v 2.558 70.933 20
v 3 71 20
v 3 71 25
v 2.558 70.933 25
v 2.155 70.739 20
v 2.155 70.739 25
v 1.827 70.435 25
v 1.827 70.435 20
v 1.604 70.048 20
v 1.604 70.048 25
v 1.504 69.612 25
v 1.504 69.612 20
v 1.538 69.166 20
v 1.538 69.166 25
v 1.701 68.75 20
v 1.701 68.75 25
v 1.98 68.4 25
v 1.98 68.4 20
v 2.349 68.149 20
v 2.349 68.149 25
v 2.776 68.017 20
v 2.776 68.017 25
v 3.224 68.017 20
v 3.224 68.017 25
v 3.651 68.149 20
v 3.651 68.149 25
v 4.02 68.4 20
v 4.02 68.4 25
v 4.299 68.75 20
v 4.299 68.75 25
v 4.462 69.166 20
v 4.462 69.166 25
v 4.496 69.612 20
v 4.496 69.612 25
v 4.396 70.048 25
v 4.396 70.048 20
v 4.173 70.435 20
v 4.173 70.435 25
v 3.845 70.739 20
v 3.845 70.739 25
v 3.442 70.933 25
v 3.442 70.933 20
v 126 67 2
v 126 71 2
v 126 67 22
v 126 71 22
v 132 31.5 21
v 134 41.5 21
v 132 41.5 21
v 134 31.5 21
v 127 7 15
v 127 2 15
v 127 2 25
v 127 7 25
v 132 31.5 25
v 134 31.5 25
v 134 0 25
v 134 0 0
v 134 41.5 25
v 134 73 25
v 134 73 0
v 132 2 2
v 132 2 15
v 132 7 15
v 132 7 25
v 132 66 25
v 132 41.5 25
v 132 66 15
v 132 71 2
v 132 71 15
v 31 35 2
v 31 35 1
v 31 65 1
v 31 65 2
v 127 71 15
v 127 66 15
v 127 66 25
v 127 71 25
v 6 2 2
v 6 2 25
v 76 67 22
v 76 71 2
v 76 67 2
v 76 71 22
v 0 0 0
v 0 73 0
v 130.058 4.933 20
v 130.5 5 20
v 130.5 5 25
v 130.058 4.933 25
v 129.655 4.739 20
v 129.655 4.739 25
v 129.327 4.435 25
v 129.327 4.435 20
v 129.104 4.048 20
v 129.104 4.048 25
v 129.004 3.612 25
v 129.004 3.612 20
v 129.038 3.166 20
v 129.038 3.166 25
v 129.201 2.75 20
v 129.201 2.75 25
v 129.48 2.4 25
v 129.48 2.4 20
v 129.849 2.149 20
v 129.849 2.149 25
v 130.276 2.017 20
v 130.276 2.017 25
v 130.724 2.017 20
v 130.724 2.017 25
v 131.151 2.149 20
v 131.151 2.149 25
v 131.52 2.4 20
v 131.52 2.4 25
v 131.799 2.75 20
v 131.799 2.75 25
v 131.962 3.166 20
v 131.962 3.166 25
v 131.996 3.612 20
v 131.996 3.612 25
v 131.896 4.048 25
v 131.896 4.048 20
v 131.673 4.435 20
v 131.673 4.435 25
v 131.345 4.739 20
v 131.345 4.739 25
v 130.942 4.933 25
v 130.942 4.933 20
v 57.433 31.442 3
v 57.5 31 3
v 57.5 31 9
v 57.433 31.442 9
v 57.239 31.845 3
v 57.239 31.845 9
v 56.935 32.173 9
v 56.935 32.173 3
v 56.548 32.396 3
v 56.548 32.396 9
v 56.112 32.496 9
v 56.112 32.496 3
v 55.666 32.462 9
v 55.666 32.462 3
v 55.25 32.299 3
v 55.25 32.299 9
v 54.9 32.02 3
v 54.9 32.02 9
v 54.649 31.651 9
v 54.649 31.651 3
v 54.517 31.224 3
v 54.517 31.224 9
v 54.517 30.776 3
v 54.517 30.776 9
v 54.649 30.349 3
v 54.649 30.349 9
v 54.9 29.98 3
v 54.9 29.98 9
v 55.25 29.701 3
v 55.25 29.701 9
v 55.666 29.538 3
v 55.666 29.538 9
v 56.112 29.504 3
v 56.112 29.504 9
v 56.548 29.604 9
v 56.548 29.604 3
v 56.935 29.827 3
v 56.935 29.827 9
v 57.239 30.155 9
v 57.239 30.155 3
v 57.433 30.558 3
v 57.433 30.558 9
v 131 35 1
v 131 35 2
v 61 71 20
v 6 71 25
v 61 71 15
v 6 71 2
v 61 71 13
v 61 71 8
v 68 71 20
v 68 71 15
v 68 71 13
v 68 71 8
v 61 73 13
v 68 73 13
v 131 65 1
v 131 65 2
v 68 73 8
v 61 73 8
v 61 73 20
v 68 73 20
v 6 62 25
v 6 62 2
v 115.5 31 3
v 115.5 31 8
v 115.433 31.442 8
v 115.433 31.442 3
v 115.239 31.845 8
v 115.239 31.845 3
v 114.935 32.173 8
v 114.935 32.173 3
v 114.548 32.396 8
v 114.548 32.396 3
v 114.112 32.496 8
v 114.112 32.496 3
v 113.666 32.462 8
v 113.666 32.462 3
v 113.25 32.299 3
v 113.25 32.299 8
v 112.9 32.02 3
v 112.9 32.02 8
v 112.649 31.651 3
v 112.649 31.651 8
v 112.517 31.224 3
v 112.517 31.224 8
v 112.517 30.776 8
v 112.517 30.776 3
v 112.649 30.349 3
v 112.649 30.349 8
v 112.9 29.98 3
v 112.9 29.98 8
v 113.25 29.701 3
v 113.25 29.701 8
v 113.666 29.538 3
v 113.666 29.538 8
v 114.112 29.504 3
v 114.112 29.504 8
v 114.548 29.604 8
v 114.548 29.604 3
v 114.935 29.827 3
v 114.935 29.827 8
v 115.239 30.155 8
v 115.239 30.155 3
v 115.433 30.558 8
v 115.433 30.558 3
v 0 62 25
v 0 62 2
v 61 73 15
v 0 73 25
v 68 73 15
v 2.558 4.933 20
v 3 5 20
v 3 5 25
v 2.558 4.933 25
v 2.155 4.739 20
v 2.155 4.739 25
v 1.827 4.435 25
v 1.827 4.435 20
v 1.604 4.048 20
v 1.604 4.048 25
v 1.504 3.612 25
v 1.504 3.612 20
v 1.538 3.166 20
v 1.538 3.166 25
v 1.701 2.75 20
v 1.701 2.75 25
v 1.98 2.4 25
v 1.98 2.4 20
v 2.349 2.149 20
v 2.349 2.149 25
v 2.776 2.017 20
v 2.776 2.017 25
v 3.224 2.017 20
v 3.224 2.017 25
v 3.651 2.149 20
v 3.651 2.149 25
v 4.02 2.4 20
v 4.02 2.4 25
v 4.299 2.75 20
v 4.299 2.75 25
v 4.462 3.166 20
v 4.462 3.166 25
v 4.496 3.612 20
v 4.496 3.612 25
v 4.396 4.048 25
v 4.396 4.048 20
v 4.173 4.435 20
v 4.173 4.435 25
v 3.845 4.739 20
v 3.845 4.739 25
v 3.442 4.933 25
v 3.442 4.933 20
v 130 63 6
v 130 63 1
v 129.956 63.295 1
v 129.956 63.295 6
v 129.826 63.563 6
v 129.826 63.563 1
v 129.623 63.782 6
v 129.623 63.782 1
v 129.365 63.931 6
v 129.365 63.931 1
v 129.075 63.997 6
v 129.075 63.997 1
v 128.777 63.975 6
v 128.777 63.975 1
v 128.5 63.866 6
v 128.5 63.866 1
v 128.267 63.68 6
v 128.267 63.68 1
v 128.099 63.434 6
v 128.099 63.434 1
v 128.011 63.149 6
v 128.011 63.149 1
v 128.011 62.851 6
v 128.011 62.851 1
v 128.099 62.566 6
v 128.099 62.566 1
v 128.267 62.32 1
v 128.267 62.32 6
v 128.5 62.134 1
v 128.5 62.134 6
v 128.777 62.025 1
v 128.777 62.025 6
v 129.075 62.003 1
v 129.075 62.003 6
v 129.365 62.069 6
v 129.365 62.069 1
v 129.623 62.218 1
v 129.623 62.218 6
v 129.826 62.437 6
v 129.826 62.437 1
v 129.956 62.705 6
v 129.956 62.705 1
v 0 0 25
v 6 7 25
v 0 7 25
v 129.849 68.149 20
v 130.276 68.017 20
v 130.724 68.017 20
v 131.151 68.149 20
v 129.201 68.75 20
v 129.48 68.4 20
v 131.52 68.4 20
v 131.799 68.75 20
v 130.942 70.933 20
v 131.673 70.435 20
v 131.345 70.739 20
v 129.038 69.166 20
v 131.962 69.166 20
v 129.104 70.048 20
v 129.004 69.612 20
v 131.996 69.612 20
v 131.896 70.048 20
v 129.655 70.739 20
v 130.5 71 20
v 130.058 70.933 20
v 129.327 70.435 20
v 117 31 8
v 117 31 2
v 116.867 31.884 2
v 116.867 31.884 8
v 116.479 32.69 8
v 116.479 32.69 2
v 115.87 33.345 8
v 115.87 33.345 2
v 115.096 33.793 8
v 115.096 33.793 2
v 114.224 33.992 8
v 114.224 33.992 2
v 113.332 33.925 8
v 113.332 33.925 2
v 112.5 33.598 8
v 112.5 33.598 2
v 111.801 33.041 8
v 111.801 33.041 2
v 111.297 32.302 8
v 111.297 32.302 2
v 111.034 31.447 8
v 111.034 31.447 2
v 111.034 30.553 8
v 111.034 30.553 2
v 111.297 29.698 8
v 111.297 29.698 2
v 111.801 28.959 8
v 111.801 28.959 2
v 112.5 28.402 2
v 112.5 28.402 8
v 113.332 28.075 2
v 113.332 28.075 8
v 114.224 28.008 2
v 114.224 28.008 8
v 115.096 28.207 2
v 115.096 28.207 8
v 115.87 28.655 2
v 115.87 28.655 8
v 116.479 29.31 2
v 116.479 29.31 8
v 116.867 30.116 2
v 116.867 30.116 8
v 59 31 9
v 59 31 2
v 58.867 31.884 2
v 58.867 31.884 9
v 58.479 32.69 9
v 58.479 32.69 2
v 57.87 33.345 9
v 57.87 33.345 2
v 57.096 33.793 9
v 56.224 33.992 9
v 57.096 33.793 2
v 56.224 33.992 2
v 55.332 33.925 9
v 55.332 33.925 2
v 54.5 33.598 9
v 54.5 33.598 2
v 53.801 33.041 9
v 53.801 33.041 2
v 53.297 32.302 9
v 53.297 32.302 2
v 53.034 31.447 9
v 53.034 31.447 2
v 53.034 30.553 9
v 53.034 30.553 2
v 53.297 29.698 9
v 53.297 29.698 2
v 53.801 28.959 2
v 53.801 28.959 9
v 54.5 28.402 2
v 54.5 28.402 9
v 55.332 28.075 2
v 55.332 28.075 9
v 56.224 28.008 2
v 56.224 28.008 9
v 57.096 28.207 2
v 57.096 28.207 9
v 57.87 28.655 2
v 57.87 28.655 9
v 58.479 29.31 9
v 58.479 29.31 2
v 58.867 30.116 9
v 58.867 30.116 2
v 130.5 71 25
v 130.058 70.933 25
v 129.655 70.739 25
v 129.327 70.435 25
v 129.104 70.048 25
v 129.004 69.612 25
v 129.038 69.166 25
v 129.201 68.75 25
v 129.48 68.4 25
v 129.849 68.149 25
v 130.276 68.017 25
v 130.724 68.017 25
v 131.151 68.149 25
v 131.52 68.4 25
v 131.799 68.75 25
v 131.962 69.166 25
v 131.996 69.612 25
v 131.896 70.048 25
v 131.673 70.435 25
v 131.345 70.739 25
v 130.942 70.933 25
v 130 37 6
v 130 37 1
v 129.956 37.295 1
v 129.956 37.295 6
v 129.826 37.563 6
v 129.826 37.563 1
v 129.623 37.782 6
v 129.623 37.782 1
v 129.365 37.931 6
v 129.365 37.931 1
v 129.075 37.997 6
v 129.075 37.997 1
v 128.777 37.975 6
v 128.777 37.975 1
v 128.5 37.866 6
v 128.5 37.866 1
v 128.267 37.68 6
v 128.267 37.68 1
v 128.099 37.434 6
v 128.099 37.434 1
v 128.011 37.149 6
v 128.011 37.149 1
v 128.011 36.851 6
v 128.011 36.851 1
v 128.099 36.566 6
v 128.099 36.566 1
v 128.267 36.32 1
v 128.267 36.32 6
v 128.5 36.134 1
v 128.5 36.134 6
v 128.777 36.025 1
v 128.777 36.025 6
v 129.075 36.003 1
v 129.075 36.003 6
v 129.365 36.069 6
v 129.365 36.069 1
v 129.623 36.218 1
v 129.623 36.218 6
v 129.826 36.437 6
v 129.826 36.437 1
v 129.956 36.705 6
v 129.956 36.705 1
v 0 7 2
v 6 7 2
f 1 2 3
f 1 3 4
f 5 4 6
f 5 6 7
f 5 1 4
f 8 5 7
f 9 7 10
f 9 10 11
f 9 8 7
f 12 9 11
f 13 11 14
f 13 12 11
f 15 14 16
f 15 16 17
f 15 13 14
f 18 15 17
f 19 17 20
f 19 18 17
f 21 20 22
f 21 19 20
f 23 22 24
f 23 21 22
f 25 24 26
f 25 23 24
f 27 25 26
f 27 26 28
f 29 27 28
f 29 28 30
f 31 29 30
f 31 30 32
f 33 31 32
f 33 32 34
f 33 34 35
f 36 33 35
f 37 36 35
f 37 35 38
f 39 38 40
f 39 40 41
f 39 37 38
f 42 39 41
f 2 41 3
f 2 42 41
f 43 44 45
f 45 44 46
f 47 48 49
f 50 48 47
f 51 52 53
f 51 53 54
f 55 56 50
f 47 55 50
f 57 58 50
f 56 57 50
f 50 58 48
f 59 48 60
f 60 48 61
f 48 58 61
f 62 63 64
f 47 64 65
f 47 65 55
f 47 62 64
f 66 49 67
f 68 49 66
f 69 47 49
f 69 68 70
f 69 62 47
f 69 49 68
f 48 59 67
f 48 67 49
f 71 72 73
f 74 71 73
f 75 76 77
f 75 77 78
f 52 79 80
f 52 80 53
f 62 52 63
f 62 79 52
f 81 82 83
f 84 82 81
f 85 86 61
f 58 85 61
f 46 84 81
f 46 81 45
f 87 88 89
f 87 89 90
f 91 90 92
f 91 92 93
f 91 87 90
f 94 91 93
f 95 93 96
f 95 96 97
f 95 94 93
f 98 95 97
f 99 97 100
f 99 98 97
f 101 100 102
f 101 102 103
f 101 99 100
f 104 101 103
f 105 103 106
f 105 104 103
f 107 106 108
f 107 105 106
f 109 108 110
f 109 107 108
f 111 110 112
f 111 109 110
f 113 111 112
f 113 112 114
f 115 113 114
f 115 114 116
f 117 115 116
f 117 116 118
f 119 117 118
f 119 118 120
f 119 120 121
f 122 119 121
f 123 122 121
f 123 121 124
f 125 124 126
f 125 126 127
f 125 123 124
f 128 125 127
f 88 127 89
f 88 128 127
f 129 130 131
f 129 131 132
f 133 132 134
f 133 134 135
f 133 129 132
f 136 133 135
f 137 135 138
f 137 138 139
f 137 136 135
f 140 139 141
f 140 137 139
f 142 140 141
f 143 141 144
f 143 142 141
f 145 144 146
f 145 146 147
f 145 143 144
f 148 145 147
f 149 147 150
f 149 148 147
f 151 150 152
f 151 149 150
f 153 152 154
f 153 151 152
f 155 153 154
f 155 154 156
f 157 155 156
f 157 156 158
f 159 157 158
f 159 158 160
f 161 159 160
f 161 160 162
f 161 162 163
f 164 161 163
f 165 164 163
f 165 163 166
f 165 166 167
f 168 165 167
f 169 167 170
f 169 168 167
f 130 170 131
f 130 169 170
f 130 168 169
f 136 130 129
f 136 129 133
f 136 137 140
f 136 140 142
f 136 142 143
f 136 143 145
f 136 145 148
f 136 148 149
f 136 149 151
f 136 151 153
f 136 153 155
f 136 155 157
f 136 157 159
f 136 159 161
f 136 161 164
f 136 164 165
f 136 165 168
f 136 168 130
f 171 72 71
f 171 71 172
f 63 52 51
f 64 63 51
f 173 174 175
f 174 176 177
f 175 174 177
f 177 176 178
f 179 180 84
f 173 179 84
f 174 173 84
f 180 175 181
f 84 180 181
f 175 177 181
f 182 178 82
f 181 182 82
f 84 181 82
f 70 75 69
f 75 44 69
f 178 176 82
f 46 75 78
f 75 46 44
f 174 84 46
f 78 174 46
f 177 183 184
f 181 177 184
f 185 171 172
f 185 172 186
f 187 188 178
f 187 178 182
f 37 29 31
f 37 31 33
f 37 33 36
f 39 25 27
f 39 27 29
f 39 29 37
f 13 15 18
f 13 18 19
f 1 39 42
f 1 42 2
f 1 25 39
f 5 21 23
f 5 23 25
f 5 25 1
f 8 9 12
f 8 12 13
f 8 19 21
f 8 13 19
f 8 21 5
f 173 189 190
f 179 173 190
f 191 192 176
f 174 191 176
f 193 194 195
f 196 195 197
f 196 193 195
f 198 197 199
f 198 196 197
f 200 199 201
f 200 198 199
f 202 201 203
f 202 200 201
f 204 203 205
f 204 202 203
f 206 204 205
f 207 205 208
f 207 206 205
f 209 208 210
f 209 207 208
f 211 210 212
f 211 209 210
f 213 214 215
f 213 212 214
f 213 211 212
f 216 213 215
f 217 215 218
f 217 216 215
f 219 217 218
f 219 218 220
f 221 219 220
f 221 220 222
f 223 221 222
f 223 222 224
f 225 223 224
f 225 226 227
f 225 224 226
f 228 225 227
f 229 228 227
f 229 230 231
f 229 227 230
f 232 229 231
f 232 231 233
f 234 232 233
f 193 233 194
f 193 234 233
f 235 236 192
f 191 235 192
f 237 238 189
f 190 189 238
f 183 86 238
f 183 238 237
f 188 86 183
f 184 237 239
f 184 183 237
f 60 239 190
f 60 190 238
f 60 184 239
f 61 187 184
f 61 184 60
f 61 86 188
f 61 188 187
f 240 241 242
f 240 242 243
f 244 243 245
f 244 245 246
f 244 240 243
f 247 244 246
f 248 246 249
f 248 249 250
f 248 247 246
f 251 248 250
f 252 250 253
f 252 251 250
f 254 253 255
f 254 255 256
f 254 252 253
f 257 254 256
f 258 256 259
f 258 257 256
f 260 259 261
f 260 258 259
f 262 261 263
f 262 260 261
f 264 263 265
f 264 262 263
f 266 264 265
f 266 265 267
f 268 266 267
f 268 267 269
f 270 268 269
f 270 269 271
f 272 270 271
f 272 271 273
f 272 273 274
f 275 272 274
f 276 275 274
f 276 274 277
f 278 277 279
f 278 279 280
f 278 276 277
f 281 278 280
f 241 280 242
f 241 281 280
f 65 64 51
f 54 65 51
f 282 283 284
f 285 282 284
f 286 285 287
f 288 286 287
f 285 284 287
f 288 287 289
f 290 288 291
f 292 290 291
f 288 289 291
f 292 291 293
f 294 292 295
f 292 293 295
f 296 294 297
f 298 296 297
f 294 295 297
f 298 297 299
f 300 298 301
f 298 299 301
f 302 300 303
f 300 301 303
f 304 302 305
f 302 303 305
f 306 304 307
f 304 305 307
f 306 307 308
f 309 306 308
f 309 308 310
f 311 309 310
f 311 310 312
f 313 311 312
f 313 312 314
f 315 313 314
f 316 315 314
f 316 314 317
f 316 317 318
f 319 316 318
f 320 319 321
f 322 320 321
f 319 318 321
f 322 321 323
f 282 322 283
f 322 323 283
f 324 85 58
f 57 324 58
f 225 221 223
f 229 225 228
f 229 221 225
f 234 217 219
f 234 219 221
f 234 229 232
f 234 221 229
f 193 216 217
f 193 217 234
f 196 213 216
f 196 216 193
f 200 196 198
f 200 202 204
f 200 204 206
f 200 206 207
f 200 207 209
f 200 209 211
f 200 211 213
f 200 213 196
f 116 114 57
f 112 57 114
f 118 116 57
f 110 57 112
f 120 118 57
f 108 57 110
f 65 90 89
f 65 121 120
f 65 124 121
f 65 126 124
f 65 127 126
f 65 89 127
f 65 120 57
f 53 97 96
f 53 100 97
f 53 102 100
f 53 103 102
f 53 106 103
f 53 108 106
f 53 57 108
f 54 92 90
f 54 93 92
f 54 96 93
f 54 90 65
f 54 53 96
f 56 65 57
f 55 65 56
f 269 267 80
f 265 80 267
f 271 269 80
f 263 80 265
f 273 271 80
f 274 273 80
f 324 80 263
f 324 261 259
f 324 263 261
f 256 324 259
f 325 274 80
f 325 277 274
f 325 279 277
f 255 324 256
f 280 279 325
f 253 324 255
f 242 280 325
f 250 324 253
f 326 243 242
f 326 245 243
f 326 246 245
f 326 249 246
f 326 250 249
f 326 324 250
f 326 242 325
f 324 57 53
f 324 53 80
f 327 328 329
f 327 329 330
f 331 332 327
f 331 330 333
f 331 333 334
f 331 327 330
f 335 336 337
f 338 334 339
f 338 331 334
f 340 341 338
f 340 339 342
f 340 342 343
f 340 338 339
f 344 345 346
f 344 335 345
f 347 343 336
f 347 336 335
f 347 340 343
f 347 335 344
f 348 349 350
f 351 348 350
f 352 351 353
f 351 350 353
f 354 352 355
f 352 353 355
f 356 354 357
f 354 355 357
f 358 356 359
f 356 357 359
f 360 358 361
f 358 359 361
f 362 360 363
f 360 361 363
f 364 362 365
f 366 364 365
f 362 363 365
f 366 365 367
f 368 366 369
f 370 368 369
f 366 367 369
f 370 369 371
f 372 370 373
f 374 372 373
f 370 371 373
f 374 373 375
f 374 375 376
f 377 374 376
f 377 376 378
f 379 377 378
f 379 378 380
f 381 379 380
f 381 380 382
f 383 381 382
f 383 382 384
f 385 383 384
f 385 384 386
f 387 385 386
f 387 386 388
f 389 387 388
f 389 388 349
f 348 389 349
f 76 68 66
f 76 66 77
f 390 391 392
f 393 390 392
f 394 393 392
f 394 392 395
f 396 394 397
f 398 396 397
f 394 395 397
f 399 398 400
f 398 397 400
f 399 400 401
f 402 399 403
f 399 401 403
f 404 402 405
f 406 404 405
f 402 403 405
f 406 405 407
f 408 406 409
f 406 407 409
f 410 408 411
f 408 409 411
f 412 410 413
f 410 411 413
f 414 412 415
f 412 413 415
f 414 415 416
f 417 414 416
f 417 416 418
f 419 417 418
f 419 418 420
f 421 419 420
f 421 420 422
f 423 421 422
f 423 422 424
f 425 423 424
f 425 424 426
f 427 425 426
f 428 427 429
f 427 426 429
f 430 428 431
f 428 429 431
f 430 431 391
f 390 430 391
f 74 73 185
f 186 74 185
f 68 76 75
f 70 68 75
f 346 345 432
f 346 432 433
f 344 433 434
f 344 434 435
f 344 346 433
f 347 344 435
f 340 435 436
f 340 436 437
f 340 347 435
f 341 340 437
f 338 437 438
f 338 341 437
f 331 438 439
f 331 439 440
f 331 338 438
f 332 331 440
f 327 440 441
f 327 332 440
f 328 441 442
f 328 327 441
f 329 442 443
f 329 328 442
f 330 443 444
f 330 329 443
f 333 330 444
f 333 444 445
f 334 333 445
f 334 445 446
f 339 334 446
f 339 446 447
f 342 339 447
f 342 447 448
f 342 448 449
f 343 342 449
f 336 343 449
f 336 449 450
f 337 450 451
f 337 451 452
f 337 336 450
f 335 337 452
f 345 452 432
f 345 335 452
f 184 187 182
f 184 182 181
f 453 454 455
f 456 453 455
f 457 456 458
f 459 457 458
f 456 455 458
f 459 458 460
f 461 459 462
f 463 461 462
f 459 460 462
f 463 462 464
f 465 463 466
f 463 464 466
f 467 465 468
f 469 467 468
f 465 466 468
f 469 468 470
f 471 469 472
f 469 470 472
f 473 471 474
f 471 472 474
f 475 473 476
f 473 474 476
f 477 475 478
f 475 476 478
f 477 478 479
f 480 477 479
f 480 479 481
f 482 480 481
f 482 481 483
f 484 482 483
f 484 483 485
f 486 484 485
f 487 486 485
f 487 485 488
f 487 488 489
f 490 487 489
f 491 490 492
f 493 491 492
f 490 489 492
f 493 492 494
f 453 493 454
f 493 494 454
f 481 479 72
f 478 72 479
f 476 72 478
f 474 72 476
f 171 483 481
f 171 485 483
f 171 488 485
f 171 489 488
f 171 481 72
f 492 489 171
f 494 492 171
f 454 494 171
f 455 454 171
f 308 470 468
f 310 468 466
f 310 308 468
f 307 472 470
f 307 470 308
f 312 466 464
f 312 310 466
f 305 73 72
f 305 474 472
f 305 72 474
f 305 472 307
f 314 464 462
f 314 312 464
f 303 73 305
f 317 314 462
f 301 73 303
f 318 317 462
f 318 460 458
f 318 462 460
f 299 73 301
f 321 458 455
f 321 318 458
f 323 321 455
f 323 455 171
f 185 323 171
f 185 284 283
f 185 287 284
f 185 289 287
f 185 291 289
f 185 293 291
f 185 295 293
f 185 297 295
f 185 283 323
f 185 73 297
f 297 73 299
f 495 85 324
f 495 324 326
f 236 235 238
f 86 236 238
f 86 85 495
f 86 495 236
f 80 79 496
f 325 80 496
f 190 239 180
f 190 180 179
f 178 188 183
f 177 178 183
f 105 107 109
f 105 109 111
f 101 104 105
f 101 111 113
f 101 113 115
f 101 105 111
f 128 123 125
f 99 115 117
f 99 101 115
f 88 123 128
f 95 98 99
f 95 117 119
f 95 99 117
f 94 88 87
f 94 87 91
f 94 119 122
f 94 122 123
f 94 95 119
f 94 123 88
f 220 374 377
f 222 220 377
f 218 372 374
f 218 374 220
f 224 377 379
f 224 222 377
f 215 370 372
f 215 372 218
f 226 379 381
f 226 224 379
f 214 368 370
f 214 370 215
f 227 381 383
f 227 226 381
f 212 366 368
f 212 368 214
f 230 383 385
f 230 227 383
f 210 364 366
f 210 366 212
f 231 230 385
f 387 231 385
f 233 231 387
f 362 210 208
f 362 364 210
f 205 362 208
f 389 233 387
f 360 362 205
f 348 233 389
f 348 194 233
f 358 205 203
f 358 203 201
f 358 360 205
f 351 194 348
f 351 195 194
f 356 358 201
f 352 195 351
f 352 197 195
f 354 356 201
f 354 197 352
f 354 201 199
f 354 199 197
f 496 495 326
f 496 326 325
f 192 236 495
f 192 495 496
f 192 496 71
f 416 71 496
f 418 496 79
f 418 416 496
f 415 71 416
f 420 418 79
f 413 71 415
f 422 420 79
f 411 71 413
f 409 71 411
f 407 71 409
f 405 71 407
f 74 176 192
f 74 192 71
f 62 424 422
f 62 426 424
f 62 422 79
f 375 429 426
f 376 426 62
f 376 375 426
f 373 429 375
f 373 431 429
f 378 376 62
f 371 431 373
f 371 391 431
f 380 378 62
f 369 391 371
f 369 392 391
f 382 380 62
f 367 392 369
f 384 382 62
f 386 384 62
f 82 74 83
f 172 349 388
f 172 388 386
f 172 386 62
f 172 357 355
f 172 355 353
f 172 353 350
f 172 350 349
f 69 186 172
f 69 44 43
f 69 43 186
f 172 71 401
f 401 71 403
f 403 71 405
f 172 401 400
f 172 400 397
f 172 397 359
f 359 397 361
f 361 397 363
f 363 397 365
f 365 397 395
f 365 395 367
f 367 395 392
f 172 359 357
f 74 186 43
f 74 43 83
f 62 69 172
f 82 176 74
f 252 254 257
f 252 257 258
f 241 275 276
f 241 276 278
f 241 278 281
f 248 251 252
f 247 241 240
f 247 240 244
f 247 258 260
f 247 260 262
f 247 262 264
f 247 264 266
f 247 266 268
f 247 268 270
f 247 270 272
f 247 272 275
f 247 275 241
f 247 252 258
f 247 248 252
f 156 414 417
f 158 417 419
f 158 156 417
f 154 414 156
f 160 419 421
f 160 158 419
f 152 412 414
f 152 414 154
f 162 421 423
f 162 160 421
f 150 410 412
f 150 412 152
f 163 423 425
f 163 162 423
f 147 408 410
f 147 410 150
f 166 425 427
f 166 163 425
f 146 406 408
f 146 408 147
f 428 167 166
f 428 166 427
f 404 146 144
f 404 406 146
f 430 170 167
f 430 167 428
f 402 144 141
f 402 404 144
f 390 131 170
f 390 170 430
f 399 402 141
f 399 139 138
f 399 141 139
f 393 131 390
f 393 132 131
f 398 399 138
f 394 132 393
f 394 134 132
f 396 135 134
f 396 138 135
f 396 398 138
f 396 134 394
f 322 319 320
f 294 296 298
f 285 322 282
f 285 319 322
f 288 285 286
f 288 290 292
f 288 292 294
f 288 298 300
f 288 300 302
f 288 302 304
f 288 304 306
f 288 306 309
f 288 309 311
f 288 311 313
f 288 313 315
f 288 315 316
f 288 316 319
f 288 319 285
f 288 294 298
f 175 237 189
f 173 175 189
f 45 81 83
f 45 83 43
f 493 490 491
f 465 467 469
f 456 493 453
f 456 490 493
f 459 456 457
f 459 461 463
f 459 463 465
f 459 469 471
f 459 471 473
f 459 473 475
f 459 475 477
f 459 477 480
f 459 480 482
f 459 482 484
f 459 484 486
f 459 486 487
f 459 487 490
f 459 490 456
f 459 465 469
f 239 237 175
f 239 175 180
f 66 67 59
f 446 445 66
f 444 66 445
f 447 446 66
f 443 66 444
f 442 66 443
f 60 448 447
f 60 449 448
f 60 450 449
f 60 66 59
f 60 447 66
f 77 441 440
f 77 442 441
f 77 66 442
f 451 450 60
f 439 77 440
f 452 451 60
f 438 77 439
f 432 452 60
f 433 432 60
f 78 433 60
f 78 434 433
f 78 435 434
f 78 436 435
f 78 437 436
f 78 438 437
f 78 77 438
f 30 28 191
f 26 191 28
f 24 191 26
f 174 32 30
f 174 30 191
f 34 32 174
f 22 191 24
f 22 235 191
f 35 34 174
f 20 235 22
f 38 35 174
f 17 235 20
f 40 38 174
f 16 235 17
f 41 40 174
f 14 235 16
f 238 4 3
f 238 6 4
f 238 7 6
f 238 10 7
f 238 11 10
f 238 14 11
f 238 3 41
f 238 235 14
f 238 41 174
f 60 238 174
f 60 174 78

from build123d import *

# Parameters (mm, degrees)
BOX_W             = 134
BOX_H             = 73
BOX_DEPTH         = 25
BOX001_W          = 126
BOX001_H          = 69
BOX001_DEPTH      = 23
BOX002_W          = 10
BOX002_H          = 55
BOX002_DEPTH      = 23
BOX003_W          = 100
BOX003_H          = 30
BOX003_DEPTH      = 1
CYLINDER_R        = 1
CYLINDER_DEPTH    = 5
CYLINDER001_R     = 1
CYLINDER001_DEPTH = 5
CYLINDER002_R     = 3
CYLINDER002_DEPTH = 7
CYLINDER003_R     = 1.5
CYLINDER003_DEPTH = 6
CYLINDER004_R     = 3
CYLINDER004_DEPTH = 7
CYLINDER005_R     = 1.5
CYLINDER005_DEPTH = 6
BOX004_W          = 7
BOX004_H          = 5
BOX004_DEPTH      = 7
BOX005_W          = 7
BOX005_H          = 5
BOX005_DEPTH      = 5
BOX006_W          = 50
BOX006_H          = 20
BOX006_DEPTH      = 4
BOX007_W          = 4
BOX007_H          = 10
BOX007_DEPTH      = 2
CYLINDER006_R     = 1.5
CYLINDER006_DEPTH = 5
CYLINDER007_R     = 1.5
CYLINDER007_DEPTH = 5
BOX008_W          = 5
BOX008_H          = 5
BOX008_DEPTH      = 10
BOX009_W          = 5
BOX009_H          = 5
BOX009_DEPTH      = 10
CYLINDER008_R     = 1.5
CYLINDER008_DEPTH = 5
CYLINDER009_R     = 1.5
CYLINDER009_DEPTH = 5


with BuildPart() as part:
    # Box → Box (join)
    with BuildSketch(Plane.XY):
        with Locations((67, 36.5)):
            Rectangle(BOX_W, BOX_H)
    extrude(amount=BOX_DEPTH)

    # Box001 → Box001 (cut)
    with BuildSketch(Plane(origin=(6, 2, 2), x_dir=(1, 0, 0), z_dir=(0, 0, 1))):
        with Locations((63, 34.5)):
            Rectangle(BOX001_W, BOX001_H)
    extrude(amount=BOX001_DEPTH, mode=Mode.SUBTRACT)

    # Box002 → Box002 (cut)
    with BuildSketch(Plane(origin=(-2, 7, 2), x_dir=(1, 0, 0), z_dir=(0, 0, 1))):
        with Locations((5, 27.5)):
            Rectangle(BOX002_W, BOX002_H)
    extrude(amount=BOX002_DEPTH, mode=Mode.SUBTRACT)

    # Box003 → Box003 (cut)
    with BuildSketch(Plane(origin=(31, 35, 1), x_dir=(1, 0, 0), z_dir=(0, 0, 1))):
        with Locations((50, 15)):
            Rectangle(BOX003_W, BOX003_H)
    extrude(amount=BOX003_DEPTH, mode=Mode.SUBTRACT)

    # Cylinder → Cylinder (join)
    with BuildSketch(Plane(origin=(129, 37, 1), x_dir=(1, 0, 0), z_dir=(0, 0, 1))):
        Circle(CYLINDER_R)
    extrude(amount=CYLINDER_DEPTH)

    # Cylinder001 → Cylinder001 (join)
    with BuildSketch(Plane(origin=(129, 63, 1), x_dir=(1, 0, 0), z_dir=(0, 0, 1))):
        Circle(CYLINDER001_R)
    extrude(amount=CYLINDER001_DEPTH)

    # Cylinder002 → Cylinder002 (join)
    with BuildSketch(Plane(origin=(114, 31, 1), x_dir=(1, 0, 0), z_dir=(0, 0, 1))):
        Circle(CYLINDER002_R)
    extrude(amount=CYLINDER002_DEPTH)

    # Cylinder003 → Cylinder003 (cut)
    with BuildSketch(Plane(origin=(114, 31, 3), x_dir=(1, 0, 0), z_dir=(0, 0, 1))):
        Circle(CYLINDER003_R)
    extrude(amount=CYLINDER003_DEPTH, mode=Mode.SUBTRACT)

    # Cylinder004 → Cylinder004 (join)
    with BuildSketch(Plane(origin=(56, 31, 2), x_dir=(1, 0, 0), z_dir=(0, 0, 1))):
        Circle(CYLINDER004_R)
    extrude(amount=CYLINDER004_DEPTH)

    # Cylinder005 → Cylinder005 (cut)
    with BuildSketch(Plane(origin=(56, 31, 3), x_dir=(1, 0, 0), z_dir=(0, 0, 1))):
        Circle(CYLINDER005_R)
    extrude(amount=CYLINDER005_DEPTH, mode=Mode.SUBTRACT)

    # Box004 → Box004 (cut)
    with BuildSketch(Plane(origin=(61, 74, 8), x_dir=(1, 0, 0), z_dir=(0, -1, 0))):
        with Locations((3.5, 2.5)):
            Rectangle(BOX004_W, BOX004_H)
    extrude(amount=BOX004_DEPTH, mode=Mode.SUBTRACT)

    # Box005 → Box005 (cut)
    with BuildSketch(Plane(origin=(61, 74, 15), x_dir=(1, 0, 0), z_dir=(0, -1, 0))):
        with Locations((3.5, 2.5)):
            Rectangle(BOX005_W, BOX005_H)
    extrude(amount=BOX005_DEPTH, mode=Mode.SUBTRACT)

    # Box006 → Box006 (join)
    with BuildSketch(Plane(origin=(76, 71, 2), x_dir=(1, 0, 0), z_dir=(0, -1, 0))):
        with Locations((25, 10)):
            Rectangle(BOX006_W, BOX006_H)
    extrude(amount=BOX006_DEPTH)

    # Box007 → Box007 (cut)
    with BuildSketch(Plane(origin=(134, 41.5, 25), x_dir=(0, 0, -1), z_dir=(-1, 0, 0))):
        with Locations((2, 5)):
            Rectangle(BOX007_W, BOX007_H)
    extrude(amount=BOX007_DEPTH, mode=Mode.SUBTRACT)

    # Cylinder006 → Cylinder006 (cut)
    with BuildSketch(Plane(origin=(3, 3.5, 20), x_dir=(0, 1, 0), z_dir=(0, 0, 1))):
        Circle(CYLINDER006_R)
    extrude(amount=CYLINDER006_DEPTH, mode=Mode.SUBTRACT)

    # Cylinder007 → Cylinder007 (cut)
    with BuildSketch(Plane(origin=(3, 69.5, 20), x_dir=(0, 1, 0), z_dir=(0, 0, 1))):
        Circle(CYLINDER007_R)
    extrude(amount=CYLINDER007_DEPTH, mode=Mode.SUBTRACT)

    # Box008 → Box008 (join)
    with BuildSketch(Plane(origin=(132, 2, 15), x_dir=(0, 1, 0), z_dir=(0, 0, 1))):
        with Locations((2.5, 2.5)):
            Rectangle(BOX008_W, BOX008_H)
    extrude(amount=BOX008_DEPTH)

    # Box009 → Box009 (join)
    with BuildSketch(Plane(origin=(132, 66, 15), x_dir=(0, 1, 0), z_dir=(0, 0, 1))):
        with Locations((2.5, 2.5)):
            Rectangle(BOX009_W, BOX009_H)
    extrude(amount=BOX009_DEPTH)

    # Cylinder008 → Cylinder008 (cut)
    with BuildSketch(Plane(origin=(130.5, 69.5, 20), x_dir=(0, 1, 0), z_dir=(0, 0, 1))):
        Circle(CYLINDER008_R)
    extrude(amount=CYLINDER008_DEPTH, mode=Mode.SUBTRACT)

    # Cylinder009 → Cylinder009 (cut)
    with BuildSketch(Plane(origin=(130.5, 3.5, 20), x_dir=(0, 1, 0), z_dir=(0, 0, 1))):
        Circle(CYLINDER009_R)
    extrude(amount=CYLINDER009_DEPTH, mode=Mode.SUBTRACT)


solid = part.part
